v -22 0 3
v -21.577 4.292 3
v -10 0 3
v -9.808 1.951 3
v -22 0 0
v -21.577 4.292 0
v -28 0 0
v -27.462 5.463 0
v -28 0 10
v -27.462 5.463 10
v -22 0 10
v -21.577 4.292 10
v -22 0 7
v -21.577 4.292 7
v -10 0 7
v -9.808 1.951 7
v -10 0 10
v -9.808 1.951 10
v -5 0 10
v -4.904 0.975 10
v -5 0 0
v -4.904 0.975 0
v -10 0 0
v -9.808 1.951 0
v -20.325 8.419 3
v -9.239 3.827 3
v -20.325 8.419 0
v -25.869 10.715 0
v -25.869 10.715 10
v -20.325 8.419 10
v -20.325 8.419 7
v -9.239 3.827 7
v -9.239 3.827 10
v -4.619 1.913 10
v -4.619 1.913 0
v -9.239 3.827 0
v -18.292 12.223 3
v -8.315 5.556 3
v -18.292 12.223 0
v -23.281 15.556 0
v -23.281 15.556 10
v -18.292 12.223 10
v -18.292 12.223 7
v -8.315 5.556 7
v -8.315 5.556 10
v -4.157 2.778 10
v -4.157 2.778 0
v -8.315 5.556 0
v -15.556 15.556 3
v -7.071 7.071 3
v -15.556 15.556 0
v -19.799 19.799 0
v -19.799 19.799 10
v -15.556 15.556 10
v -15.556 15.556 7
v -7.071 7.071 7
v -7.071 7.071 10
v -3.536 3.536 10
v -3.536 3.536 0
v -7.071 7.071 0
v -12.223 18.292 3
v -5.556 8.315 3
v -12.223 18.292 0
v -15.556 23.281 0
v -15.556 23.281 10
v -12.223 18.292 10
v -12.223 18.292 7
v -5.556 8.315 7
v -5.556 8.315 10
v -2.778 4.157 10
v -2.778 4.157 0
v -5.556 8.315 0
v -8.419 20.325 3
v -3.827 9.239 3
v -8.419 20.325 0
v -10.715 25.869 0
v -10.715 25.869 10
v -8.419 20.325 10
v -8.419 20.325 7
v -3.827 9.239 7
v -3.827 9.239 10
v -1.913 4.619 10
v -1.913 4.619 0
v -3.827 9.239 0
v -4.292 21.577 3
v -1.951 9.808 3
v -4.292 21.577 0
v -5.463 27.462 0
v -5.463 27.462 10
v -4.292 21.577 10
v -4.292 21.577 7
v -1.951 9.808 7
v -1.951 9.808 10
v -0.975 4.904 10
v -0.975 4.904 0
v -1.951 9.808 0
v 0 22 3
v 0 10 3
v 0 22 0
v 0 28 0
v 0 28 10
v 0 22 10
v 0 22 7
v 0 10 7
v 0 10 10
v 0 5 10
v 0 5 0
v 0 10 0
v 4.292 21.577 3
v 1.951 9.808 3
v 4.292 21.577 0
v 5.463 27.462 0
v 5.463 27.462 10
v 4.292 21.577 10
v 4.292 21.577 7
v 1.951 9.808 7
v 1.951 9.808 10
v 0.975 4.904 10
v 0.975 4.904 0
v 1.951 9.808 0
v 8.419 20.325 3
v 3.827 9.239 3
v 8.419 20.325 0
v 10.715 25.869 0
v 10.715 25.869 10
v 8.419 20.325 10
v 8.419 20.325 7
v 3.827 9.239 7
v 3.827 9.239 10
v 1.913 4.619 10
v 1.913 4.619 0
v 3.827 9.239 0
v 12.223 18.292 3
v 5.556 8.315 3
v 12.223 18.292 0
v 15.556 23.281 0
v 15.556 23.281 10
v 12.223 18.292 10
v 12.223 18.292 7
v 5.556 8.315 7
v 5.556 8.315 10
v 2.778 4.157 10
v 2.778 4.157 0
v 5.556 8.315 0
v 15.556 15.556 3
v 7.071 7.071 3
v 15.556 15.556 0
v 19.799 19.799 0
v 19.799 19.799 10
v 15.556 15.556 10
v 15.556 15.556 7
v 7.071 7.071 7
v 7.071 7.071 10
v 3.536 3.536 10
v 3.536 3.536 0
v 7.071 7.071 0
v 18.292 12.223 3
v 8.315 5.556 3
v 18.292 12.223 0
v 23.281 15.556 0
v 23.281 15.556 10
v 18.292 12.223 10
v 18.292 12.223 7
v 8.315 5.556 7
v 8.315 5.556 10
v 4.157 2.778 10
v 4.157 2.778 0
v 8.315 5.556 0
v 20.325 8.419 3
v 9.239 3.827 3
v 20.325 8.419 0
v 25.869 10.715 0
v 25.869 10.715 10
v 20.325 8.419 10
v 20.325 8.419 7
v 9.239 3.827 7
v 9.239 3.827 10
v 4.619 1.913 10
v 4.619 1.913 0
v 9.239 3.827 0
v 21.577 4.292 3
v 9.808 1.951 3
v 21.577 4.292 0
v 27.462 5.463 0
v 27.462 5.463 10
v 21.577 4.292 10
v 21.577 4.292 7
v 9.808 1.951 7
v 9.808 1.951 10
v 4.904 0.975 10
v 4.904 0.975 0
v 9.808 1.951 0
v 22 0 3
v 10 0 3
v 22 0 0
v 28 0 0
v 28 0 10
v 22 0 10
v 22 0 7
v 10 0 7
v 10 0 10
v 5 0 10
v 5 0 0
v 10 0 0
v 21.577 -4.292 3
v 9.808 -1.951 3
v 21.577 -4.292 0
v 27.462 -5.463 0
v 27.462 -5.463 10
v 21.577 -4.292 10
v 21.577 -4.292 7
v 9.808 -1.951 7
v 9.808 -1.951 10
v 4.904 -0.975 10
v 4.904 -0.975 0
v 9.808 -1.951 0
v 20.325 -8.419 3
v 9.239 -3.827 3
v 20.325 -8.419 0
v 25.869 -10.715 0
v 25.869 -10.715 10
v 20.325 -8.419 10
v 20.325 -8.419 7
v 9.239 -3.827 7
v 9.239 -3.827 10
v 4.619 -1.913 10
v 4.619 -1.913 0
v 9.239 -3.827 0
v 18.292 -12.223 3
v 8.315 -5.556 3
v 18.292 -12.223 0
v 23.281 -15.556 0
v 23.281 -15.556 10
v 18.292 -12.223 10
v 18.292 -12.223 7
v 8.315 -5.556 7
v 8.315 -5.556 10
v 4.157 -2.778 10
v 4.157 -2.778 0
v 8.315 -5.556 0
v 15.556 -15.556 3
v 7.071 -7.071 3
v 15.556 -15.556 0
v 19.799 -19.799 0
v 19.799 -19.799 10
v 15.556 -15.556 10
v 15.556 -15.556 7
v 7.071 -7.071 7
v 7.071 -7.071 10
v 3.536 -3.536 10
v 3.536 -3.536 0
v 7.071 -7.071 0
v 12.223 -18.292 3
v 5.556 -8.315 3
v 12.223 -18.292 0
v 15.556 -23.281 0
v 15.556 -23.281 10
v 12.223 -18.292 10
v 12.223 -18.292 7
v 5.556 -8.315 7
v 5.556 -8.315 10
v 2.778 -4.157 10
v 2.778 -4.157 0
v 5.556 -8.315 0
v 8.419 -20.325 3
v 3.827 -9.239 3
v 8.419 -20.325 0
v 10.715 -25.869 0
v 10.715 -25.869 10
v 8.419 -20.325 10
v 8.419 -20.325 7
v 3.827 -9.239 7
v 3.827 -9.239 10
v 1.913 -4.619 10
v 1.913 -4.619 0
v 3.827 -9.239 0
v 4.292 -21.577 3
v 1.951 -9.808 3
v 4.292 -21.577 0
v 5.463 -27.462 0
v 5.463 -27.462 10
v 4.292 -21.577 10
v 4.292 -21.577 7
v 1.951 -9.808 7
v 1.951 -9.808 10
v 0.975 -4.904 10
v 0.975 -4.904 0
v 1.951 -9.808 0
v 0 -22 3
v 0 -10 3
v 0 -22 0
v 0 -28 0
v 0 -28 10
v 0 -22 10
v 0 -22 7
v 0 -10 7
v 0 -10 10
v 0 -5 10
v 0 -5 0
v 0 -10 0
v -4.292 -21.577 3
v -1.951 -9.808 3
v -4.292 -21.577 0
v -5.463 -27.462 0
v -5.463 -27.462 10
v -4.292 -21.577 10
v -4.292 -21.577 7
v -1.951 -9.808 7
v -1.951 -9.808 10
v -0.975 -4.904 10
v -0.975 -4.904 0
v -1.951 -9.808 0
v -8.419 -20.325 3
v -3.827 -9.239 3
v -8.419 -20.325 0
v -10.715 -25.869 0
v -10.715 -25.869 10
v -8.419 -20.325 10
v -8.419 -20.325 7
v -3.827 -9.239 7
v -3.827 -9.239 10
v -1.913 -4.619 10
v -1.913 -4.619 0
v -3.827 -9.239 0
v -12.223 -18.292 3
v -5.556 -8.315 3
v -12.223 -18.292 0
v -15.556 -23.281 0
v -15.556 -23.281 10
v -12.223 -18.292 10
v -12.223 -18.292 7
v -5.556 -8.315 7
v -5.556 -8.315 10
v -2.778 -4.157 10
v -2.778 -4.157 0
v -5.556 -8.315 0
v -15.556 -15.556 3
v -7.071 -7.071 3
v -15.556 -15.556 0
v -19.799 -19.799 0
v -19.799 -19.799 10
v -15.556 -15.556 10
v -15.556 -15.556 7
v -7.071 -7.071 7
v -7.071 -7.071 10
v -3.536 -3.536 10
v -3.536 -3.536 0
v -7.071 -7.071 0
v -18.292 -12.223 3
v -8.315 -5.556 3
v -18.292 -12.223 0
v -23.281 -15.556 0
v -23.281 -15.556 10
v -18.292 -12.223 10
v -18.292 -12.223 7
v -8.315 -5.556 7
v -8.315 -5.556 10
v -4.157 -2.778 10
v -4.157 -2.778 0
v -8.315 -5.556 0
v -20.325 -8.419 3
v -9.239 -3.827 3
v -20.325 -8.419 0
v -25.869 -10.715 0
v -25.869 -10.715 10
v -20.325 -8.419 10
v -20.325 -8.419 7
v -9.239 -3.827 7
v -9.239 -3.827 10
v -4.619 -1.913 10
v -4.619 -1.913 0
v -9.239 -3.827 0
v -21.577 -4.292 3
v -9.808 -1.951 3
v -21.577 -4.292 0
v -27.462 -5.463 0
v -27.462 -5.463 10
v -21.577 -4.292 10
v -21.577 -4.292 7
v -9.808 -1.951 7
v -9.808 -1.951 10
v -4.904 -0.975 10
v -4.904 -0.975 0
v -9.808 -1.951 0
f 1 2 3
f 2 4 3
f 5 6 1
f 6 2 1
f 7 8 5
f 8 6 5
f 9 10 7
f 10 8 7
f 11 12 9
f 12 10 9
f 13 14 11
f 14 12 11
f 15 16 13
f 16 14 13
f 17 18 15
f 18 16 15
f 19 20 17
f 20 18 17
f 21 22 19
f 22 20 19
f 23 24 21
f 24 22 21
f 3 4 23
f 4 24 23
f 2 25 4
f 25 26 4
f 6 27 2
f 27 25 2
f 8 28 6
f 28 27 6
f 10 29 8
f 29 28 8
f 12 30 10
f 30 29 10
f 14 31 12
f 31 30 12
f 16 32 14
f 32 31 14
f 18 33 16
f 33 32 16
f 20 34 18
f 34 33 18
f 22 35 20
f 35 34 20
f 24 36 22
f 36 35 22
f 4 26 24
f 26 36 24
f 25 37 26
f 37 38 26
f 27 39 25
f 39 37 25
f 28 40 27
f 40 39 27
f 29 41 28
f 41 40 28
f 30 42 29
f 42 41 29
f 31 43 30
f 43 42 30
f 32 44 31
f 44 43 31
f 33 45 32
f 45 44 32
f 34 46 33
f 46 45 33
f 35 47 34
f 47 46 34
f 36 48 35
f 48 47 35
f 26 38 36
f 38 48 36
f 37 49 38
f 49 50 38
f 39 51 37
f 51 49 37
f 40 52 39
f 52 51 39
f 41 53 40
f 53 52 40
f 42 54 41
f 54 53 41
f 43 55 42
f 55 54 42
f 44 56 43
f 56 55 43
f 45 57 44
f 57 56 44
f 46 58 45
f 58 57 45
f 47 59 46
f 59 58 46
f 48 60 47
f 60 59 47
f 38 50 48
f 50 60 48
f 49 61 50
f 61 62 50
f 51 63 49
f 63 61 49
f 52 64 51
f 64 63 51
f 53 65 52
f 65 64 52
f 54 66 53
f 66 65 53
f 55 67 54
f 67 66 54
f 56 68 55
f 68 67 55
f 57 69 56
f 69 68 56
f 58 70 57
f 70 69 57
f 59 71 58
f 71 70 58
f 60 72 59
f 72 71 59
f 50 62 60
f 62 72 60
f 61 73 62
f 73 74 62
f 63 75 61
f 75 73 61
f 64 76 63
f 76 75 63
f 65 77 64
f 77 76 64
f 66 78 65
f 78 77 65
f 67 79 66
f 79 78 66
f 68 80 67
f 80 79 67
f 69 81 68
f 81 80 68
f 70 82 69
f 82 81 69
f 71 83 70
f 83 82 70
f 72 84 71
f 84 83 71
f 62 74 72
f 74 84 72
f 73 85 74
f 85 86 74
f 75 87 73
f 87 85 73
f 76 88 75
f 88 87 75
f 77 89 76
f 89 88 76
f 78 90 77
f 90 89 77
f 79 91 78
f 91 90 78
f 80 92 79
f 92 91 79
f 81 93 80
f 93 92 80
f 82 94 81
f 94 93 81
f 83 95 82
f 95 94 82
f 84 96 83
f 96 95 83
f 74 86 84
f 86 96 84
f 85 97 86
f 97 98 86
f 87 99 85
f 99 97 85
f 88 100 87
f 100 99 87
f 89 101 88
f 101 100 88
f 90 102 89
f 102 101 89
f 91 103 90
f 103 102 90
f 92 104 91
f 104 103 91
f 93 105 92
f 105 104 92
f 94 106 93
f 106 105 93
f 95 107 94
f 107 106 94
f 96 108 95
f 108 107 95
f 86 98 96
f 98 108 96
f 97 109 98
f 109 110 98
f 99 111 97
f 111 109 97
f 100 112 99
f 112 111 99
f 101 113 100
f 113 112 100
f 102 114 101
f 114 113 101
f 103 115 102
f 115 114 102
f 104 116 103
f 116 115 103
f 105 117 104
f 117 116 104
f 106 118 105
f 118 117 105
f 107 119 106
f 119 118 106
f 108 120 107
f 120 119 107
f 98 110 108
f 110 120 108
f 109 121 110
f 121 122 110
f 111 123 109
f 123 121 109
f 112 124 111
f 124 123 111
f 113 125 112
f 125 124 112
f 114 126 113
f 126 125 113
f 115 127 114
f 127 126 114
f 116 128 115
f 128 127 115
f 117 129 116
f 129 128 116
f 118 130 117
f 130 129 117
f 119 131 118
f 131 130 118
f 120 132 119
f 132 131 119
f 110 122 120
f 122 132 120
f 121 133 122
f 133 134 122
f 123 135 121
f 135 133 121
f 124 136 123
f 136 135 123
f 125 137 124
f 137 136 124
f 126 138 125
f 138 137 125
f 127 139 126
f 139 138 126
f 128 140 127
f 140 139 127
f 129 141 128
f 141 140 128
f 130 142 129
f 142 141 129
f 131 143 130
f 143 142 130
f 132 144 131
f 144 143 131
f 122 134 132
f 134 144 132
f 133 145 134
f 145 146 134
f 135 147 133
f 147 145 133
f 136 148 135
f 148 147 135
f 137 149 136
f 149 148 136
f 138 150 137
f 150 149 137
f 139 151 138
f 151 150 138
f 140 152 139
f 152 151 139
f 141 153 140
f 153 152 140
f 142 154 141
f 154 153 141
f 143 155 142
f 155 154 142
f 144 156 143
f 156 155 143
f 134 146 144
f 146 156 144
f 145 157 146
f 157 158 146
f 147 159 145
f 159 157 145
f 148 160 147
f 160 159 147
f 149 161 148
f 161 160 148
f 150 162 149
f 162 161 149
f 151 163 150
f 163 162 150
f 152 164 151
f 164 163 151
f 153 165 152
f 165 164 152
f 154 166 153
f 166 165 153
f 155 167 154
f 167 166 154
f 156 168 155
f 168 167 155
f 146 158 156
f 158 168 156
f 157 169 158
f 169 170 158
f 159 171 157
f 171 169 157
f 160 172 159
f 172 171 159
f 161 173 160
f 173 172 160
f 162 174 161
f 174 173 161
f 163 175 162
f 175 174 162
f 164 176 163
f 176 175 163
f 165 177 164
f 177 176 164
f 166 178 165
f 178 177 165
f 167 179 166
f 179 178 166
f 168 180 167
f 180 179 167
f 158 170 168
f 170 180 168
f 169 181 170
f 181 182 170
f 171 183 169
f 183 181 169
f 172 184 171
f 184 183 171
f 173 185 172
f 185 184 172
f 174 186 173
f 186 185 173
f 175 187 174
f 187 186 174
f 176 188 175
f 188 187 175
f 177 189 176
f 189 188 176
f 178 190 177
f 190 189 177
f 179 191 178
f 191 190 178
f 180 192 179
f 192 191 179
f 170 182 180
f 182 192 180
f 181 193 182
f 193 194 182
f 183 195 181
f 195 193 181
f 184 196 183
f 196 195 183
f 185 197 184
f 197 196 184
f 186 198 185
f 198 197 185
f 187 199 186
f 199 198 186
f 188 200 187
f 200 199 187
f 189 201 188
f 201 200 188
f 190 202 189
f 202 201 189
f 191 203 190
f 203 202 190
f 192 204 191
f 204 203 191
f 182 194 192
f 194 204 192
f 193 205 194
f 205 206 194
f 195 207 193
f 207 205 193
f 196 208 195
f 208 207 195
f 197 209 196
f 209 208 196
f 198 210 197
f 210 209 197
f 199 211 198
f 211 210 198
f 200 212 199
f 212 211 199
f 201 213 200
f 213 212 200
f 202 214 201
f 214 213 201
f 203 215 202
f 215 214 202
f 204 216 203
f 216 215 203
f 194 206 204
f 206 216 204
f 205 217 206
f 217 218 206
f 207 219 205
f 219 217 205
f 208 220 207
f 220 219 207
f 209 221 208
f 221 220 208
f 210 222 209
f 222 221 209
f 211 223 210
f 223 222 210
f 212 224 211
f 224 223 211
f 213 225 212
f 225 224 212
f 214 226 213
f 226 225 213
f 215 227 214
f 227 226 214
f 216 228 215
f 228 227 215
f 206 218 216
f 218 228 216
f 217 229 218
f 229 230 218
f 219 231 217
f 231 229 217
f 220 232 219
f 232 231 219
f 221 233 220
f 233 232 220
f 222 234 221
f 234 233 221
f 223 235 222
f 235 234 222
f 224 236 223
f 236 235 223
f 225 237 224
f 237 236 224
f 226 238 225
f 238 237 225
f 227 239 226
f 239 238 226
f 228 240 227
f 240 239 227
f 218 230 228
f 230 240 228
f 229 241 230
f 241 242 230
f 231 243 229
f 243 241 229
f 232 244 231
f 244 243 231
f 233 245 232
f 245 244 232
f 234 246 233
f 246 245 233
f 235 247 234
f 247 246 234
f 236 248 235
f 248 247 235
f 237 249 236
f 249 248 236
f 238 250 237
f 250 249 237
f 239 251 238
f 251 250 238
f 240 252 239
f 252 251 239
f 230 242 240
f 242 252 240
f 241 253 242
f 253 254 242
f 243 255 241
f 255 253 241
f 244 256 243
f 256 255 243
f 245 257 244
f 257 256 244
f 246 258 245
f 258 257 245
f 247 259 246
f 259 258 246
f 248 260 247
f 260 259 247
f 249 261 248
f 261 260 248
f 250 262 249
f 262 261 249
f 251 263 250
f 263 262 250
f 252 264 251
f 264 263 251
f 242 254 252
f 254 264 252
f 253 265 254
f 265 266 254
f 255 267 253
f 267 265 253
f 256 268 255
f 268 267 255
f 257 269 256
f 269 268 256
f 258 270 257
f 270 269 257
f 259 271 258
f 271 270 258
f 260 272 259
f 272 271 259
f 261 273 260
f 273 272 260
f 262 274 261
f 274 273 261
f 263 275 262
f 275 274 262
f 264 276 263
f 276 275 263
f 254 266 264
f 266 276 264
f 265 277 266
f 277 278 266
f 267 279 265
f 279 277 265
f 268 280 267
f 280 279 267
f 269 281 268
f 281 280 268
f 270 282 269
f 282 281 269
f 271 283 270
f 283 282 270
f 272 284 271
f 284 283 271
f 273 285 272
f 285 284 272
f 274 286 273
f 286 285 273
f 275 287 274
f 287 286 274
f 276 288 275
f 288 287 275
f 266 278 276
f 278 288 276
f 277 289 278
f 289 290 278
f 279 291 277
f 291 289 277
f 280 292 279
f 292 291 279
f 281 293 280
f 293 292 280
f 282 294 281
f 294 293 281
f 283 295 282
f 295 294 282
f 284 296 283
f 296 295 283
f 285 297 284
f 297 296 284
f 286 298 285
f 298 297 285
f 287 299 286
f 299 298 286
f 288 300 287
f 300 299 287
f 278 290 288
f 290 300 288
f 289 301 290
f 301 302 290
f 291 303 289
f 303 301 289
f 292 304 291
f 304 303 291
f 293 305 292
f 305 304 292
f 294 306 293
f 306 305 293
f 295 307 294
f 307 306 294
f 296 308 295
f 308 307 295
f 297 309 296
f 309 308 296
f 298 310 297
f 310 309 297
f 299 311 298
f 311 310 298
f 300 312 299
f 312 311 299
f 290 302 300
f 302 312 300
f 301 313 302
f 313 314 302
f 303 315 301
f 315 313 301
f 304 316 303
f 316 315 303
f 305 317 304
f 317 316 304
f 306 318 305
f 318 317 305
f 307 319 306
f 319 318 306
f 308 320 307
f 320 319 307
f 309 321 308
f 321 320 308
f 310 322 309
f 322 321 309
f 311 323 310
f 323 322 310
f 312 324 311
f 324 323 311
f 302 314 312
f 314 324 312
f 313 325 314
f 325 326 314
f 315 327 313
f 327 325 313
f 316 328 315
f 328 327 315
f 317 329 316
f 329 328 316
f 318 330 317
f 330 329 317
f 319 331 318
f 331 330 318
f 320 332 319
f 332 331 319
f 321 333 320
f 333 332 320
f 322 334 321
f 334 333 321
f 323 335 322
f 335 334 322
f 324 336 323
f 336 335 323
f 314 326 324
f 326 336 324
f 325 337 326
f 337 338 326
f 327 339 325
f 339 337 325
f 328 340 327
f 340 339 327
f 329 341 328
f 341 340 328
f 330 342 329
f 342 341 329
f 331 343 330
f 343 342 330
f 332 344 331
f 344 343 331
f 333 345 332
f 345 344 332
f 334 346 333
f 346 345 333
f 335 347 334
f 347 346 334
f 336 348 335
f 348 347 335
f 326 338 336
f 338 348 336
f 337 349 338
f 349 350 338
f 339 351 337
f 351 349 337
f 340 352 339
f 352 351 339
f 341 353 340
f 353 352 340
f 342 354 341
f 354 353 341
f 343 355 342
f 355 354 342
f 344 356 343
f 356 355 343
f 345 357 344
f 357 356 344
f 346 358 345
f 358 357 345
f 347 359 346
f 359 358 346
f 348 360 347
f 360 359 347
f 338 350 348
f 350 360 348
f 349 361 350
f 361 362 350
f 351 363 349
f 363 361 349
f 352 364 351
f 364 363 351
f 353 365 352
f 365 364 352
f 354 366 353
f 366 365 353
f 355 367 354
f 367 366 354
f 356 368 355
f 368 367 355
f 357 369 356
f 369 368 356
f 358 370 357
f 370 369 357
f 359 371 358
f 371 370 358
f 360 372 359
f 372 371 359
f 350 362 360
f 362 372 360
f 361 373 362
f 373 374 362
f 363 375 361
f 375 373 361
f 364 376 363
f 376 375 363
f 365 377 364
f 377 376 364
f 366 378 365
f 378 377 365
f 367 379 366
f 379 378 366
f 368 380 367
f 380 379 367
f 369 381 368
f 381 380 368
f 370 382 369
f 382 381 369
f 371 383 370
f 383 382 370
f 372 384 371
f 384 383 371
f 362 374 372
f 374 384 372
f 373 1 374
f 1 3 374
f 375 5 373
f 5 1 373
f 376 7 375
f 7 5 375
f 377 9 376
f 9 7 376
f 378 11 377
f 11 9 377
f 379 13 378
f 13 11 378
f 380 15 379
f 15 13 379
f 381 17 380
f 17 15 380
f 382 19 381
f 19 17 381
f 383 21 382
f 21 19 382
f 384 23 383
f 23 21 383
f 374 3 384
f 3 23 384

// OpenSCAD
$fn = 32;

// ----------------------------------------------------------------------
// Revolved part: handwheel R28
// ----------------------------------------------------------------------

// --- parameters (mm) ---
bore_r = 5;               // bore radius
rim_r = 28;               // rim radius
rim_w = 6;                // rim axial width
rim_t = 10;               // rim diameter height
hub_r = 10;               // hub radius
web_t = 4;                // web thickness
revolve_angle = 360;      // revolve sweep, degrees

bore_d = 2 * bore_r;
rim_d = 2 * rim_r;
hub_d = 2 * hub_r;

profile = [[5, 0], [10, 0], [10, 3], [22, 3], [22, 0], [28, 0], [28, 10], [22, 10], [22, 7], [10, 7], [10, 10], [5, 10]];  // primary outline, 12 points, counter clockwise

// --- the one profile operation ---
rotate_extrude(angle = revolve_angle) polygon(points = profile);
